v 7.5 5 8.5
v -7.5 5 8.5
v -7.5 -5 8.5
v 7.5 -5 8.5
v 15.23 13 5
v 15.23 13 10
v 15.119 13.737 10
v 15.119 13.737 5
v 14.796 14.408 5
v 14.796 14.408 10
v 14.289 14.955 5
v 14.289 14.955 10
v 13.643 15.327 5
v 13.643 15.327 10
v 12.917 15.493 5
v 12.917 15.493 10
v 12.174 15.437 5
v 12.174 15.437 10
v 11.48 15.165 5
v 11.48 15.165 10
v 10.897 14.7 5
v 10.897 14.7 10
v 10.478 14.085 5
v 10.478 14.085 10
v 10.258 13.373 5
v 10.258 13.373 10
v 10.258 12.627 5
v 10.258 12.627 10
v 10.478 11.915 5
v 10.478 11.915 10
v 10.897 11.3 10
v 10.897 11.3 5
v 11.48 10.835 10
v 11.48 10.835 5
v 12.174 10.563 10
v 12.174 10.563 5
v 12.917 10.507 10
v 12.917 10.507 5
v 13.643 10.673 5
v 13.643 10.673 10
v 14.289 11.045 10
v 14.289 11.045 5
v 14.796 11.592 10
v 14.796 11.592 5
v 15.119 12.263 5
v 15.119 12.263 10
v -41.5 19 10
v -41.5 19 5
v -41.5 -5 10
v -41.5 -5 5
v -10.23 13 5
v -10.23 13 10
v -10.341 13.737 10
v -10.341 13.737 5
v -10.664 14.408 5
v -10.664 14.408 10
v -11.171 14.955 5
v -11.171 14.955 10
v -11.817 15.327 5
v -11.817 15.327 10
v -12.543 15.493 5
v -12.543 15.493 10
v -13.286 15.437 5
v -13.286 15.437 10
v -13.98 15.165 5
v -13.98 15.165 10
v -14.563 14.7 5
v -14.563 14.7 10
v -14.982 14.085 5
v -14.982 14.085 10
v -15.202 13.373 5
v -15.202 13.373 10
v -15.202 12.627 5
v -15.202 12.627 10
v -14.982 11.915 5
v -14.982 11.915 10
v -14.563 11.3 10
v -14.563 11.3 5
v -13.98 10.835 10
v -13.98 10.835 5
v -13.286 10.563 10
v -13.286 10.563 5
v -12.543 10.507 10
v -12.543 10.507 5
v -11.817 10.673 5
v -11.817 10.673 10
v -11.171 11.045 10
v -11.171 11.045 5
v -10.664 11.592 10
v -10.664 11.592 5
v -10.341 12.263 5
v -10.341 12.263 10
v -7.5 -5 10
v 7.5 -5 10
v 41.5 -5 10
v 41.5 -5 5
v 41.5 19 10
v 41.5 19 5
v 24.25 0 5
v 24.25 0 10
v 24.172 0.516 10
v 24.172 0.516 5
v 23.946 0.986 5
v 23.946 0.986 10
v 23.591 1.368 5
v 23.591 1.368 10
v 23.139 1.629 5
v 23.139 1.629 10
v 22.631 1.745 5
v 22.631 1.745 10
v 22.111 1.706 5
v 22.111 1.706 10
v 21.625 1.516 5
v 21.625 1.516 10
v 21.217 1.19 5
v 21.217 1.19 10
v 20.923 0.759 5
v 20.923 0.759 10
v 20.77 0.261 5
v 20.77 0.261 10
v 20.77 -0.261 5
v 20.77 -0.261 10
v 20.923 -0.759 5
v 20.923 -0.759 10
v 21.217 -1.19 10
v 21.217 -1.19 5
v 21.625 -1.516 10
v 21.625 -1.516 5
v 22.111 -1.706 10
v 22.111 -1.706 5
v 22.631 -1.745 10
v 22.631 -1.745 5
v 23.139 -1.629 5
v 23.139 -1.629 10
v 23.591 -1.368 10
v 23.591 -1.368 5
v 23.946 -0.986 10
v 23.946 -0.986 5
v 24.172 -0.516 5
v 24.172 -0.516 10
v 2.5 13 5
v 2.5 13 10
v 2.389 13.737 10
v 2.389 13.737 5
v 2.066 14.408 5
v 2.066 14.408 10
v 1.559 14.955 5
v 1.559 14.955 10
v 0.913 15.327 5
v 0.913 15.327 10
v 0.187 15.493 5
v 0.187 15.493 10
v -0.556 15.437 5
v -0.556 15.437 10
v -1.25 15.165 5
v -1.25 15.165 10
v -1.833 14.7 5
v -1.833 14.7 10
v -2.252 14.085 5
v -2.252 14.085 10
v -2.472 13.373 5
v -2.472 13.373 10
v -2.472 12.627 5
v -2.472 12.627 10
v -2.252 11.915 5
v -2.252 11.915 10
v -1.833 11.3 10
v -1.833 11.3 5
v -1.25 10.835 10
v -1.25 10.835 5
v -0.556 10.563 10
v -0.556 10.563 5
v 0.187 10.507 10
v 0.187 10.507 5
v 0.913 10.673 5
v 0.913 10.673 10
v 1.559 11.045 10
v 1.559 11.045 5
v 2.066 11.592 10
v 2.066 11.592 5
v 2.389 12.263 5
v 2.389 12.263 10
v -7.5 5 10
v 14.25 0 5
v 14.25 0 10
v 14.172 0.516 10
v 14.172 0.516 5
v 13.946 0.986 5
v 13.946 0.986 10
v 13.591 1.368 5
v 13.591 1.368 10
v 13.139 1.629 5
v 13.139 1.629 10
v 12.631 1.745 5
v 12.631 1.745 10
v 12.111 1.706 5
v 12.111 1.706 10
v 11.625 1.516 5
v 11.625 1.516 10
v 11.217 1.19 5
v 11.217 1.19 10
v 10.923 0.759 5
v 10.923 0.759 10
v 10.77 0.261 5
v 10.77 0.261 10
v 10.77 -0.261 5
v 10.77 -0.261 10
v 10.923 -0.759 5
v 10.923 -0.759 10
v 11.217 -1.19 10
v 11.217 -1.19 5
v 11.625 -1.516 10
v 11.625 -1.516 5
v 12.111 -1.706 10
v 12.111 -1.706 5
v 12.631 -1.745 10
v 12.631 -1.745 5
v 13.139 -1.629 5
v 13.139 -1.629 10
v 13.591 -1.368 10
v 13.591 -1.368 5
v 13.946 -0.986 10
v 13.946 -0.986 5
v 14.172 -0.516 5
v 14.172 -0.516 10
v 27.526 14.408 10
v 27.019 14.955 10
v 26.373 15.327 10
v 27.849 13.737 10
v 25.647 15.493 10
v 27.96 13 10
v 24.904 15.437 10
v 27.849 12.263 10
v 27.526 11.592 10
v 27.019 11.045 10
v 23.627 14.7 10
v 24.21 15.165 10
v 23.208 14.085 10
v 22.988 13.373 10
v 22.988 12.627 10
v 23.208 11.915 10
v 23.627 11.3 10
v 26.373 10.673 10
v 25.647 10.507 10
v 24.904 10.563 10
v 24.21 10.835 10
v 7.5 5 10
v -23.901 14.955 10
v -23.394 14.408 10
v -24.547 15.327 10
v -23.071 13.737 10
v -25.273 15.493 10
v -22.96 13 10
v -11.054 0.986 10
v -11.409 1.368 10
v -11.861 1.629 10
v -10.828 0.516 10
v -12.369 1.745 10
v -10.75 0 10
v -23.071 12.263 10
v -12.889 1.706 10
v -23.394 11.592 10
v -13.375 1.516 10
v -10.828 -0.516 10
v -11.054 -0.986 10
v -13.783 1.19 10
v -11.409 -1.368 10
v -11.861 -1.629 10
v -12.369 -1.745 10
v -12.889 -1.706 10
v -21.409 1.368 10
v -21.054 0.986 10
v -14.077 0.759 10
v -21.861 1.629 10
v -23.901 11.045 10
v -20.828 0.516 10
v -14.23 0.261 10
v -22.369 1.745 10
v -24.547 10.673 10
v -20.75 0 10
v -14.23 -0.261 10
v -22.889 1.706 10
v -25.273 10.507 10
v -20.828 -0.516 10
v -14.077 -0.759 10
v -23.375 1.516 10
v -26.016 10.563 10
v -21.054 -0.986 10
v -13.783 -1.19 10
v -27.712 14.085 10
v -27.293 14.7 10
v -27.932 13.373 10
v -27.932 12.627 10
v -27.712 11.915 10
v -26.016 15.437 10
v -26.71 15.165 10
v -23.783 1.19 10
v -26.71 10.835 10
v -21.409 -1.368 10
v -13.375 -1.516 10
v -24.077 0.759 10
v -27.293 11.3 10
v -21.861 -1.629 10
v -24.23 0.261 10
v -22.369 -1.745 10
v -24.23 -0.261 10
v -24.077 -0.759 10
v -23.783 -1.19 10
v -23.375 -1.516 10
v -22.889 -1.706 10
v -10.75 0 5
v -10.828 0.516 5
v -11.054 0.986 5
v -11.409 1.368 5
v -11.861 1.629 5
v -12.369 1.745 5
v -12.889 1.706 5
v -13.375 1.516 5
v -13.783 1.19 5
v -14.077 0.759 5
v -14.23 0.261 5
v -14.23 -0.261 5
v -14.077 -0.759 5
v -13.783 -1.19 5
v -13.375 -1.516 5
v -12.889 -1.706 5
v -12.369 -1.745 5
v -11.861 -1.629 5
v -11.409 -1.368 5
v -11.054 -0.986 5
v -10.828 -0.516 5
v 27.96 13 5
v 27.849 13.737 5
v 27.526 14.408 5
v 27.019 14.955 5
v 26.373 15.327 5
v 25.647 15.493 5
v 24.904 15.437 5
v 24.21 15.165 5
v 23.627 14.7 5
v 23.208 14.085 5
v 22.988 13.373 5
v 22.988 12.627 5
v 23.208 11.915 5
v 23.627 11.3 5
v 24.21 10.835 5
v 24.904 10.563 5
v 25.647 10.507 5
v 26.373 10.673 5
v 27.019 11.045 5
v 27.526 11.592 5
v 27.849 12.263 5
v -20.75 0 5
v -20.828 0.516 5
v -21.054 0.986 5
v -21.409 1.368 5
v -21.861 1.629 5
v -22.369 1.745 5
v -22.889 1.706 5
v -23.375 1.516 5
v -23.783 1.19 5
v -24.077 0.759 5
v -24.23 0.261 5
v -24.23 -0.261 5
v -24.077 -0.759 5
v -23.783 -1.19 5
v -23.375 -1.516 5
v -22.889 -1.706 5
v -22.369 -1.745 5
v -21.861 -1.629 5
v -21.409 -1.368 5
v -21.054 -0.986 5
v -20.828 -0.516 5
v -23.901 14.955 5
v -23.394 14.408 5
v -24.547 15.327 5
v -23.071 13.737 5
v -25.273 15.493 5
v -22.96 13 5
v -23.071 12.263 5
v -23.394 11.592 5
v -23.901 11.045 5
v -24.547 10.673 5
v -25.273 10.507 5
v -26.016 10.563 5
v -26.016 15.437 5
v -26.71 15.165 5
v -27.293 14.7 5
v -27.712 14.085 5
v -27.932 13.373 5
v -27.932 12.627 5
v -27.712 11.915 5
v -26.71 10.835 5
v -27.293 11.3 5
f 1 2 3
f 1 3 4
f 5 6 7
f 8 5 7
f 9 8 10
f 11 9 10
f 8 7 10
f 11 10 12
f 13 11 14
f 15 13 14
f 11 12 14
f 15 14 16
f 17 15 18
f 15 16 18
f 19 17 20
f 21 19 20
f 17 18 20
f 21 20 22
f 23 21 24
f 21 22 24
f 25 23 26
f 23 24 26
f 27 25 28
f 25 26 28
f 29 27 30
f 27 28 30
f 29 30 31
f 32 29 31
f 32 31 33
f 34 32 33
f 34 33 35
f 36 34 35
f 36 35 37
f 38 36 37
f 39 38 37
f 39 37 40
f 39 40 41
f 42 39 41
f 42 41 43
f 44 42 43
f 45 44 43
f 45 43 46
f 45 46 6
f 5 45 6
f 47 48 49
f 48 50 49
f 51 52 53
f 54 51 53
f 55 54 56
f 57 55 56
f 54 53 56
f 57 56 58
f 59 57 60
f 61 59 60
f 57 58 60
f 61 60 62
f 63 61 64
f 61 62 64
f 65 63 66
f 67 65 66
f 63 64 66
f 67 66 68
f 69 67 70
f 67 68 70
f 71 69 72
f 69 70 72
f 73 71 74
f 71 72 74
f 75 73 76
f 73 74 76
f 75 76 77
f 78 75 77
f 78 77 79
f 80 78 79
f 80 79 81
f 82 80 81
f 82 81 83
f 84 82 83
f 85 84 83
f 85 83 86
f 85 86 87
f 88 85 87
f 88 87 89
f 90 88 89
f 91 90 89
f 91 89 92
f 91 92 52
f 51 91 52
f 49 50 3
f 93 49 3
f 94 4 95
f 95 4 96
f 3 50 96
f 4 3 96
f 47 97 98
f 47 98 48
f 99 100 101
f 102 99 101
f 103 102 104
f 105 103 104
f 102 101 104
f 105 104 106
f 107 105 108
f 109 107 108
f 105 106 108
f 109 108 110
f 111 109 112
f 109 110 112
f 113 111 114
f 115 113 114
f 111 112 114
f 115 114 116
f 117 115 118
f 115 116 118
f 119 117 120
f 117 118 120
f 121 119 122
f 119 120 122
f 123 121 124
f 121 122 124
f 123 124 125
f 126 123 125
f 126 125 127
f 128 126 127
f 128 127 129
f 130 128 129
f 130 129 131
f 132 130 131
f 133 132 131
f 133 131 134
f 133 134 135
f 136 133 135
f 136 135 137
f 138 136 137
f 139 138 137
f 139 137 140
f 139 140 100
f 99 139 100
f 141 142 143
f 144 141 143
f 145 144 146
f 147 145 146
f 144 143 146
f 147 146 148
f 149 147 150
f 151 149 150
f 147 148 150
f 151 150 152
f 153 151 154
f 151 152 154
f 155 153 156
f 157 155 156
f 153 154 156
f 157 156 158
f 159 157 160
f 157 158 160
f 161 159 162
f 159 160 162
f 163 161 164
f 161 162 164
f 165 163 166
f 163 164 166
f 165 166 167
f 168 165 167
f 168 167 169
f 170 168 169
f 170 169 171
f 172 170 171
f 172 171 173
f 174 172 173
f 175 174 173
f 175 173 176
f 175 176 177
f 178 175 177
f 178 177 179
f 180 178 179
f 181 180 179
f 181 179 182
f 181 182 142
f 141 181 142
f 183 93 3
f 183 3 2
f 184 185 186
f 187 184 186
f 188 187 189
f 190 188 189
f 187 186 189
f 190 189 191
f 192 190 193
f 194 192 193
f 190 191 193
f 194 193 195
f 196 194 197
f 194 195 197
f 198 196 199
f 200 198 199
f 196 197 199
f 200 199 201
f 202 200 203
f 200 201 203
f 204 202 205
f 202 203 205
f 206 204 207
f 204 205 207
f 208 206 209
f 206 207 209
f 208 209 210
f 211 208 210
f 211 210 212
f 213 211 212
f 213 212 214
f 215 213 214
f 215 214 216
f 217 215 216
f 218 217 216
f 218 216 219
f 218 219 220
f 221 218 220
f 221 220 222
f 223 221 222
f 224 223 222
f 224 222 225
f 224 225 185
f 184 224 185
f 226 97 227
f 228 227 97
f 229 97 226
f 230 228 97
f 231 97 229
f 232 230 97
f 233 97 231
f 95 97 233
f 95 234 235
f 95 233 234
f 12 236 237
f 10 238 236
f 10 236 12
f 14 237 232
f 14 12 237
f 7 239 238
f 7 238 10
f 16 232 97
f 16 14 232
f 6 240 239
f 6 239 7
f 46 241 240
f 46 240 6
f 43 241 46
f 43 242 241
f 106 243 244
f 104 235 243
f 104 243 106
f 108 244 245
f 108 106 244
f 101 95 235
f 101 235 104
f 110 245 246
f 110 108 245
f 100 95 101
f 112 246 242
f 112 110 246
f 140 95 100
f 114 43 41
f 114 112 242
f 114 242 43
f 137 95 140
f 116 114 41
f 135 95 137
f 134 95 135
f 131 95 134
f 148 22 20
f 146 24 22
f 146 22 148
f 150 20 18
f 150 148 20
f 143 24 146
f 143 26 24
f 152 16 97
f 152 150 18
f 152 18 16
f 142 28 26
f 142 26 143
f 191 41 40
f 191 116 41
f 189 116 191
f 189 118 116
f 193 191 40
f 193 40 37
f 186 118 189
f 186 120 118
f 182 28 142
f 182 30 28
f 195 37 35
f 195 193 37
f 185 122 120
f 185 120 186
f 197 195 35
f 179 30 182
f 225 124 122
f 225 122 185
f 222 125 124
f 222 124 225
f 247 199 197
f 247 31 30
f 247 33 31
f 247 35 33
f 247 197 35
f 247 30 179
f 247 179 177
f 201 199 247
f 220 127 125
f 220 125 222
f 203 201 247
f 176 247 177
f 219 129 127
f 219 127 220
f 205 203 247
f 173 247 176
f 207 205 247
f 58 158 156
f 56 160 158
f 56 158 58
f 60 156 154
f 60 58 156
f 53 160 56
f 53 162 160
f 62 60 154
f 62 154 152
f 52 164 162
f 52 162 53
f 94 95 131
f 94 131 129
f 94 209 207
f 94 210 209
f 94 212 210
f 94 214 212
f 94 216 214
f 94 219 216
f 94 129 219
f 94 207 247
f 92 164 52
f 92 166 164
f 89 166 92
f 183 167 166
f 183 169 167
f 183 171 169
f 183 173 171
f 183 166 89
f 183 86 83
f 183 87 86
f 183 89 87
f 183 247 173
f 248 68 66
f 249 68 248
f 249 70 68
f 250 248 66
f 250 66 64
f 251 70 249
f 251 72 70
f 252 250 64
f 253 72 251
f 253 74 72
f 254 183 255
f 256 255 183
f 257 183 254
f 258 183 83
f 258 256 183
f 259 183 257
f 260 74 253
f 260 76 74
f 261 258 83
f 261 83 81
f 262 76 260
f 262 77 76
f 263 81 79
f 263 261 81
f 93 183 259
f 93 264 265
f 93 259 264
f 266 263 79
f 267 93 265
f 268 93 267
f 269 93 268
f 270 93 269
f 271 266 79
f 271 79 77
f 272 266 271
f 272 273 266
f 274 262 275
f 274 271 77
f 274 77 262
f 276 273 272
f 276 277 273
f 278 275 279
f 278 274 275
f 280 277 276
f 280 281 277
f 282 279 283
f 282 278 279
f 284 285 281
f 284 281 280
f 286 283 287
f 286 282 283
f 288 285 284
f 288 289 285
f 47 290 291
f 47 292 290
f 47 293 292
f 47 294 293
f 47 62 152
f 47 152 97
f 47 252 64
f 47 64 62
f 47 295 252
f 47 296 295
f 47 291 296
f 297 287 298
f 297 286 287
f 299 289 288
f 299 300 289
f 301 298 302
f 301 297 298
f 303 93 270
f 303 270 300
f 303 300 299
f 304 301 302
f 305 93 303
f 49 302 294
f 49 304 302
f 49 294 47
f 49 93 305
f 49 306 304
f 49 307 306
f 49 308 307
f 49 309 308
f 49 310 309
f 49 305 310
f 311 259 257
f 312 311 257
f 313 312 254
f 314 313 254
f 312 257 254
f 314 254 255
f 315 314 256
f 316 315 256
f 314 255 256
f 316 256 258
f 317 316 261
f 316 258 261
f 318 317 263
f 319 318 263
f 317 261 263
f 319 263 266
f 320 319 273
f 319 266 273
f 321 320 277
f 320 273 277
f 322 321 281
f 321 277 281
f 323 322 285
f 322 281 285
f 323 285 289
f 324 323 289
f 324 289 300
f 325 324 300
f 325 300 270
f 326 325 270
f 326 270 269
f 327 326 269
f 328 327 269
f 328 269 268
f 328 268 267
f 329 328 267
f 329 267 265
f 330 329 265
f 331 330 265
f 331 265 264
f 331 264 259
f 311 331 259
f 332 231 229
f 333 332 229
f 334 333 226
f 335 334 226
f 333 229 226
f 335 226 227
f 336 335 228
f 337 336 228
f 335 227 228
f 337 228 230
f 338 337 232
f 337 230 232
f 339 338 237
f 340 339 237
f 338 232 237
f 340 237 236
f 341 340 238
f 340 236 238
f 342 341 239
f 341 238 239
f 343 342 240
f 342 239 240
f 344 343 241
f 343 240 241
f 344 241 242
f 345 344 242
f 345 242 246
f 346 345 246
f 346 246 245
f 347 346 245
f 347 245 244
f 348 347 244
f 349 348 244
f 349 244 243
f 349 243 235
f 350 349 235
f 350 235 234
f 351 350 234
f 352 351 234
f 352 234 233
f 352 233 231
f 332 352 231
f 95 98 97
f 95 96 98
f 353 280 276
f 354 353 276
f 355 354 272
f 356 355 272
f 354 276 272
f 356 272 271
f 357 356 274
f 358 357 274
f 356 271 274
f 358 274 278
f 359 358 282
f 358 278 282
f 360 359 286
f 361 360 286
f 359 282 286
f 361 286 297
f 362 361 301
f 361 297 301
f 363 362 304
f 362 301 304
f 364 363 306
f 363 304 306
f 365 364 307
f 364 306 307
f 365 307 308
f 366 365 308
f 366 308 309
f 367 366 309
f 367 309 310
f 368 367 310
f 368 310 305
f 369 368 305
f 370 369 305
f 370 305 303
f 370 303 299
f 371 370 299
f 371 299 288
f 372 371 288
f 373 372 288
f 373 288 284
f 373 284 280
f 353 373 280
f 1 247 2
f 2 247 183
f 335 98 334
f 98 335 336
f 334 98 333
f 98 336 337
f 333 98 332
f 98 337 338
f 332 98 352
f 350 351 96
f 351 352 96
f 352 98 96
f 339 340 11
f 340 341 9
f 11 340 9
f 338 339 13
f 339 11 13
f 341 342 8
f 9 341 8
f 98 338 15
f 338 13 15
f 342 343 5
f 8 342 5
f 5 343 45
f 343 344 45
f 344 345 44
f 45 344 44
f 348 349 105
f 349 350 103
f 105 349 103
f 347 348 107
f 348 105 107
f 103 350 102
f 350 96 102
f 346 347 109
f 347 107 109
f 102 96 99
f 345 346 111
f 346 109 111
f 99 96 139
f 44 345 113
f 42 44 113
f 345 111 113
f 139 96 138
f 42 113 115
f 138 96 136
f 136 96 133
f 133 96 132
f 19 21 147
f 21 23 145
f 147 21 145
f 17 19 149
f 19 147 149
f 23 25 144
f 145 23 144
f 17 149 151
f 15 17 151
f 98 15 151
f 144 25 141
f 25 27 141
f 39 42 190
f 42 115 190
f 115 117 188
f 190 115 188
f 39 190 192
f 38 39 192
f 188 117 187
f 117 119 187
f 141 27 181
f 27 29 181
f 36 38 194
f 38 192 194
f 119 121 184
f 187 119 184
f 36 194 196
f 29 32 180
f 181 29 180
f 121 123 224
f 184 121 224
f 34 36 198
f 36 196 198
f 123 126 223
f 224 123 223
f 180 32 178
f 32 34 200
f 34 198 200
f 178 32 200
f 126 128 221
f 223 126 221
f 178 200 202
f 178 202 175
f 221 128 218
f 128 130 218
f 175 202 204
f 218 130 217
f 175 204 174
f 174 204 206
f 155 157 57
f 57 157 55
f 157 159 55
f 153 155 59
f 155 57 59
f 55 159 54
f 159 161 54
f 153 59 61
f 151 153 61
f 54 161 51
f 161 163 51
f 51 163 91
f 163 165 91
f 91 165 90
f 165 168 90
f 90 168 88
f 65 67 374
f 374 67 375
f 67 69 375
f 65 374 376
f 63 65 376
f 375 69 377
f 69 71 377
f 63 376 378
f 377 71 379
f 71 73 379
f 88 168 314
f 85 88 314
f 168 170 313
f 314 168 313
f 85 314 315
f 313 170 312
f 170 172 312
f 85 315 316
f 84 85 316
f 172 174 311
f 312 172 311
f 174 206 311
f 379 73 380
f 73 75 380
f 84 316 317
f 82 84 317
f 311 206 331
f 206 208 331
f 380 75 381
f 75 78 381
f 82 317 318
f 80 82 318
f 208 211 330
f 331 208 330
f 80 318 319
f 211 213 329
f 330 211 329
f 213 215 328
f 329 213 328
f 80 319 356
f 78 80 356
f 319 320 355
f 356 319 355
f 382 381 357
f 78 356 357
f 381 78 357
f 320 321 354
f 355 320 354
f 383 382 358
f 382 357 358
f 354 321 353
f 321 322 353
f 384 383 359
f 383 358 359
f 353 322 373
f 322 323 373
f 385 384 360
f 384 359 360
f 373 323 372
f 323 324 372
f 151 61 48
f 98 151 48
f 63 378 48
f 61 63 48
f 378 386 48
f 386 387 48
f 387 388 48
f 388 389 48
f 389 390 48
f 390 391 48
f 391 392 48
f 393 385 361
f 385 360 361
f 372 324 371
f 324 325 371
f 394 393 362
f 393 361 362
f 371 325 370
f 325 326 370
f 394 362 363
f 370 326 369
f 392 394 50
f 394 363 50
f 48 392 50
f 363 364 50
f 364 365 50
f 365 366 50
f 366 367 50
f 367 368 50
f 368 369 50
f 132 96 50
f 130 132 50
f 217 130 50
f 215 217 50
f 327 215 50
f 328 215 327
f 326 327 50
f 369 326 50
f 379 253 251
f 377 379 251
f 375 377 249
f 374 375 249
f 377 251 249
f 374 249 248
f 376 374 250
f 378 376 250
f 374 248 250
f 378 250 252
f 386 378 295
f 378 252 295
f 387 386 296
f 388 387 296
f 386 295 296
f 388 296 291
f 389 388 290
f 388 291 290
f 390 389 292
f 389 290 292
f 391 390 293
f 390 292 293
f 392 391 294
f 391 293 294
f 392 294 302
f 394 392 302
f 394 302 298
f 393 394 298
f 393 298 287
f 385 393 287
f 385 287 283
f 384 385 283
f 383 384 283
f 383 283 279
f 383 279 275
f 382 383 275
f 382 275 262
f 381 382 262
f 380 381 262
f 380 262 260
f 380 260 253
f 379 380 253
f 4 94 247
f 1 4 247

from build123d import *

# Parameters (mm, degrees)
F0_W      = 65
F0_H      = 10
F1_DEPTH  = 10
F2_W      = 15
F2_H      = 10
F3_DEPTH  = 3
F2_R      = 1.75
F4_DEPTH  = 25
F5_DEPTH  = 9
F6_DEPTH  = 9
F7_DEPTH  = 5
F8_DEPTH  = 1.5
F9_W      = 83
F9_H      = 5
F10_DEPTH = 14
F11_R     = 2.5
F12_DEPTH = 25


with BuildPart() as f1:
    # F0 (on Top) → F1 (new body)
    with BuildSketch(Plane.XY):
        Rectangle(F0_W, F0_H)
    extrude(amount=F1_DEPTH)

    # F2 (on face) → F3 (cut)
    with BuildSketch(Plane.XY.offset(10)):
        Rectangle(F2_W, F2_H)
    extrude(amount=-F3_DEPTH, mode=Mode.SUBTRACT)

    # F2 (on face) → F4 (cut)
    with BuildSketch(Plane.XY.offset(10)):
        with Locations((-22.5, 0)):
            Circle(F2_R)
        with Locations((-12.5, 0)):
            Circle(F2_R)
        with Locations((12.5, 0)):
            Circle(F2_R)
        with Locations((22.5, 0)):
            Circle(F2_R)
    extrude(amount=-F4_DEPTH, mode=Mode.SUBTRACT)

    # F5 (add): a face of the model
    f5_faces = [f1.faces().sort_by_distance(p)[0] for p in [
        (32.5, 0, 5),
    ]]
    extrude(f5_faces, amount=F5_DEPTH)

    # F6 (add): a face of the model
    f6_faces = [f1.faces().sort_by_distance(p)[0] for p in [
        (-32.5, 0, 5),
    ]]
    extrude(f6_faces, amount=F6_DEPTH)

    # F7 (cut): a face of the model
    f7_faces = [f1.faces().sort_by_distance(p)[0] for p in [
        (0, 0, 0),
    ]]
    extrude(f7_faces, amount=-F7_DEPTH, mode=Mode.SUBTRACT)

    # F8 (add): a face of the model
    f8_faces = [f1.faces().sort_by_distance(p)[0] for p in [
        (0, 0, 7),
    ]]
    extrude(f8_faces, amount=F8_DEPTH)

    # F9 (on face) → F10 (join)
    with BuildSketch(Plane(origin=(0, 5, 0), x_dir=(-1, 0, 0), z_dir=(0, 1, 0))):
        with Locations((0, 7.5)):
            Rectangle(F9_W, F9_H)
    extrude(amount=F10_DEPTH)

    # F11 (on face) → F12 (cut)
    with BuildSketch(Plane.XY.offset(10)):
        with Locations((12.73, 13)):
            Circle(F11_R)
        with Locations((25.46, 13)):
            Circle(F11_R)
        with Locations((0, 13)):
            Circle(F11_R)
        with Locations((-12.73, 13)):
            Circle(F11_R)
        with Locations((-25.46, 13)):
            Circle(F11_R)
    extrude(amount=-F12_DEPTH, mode=Mode.SUBTRACT)


solid = f1.part
